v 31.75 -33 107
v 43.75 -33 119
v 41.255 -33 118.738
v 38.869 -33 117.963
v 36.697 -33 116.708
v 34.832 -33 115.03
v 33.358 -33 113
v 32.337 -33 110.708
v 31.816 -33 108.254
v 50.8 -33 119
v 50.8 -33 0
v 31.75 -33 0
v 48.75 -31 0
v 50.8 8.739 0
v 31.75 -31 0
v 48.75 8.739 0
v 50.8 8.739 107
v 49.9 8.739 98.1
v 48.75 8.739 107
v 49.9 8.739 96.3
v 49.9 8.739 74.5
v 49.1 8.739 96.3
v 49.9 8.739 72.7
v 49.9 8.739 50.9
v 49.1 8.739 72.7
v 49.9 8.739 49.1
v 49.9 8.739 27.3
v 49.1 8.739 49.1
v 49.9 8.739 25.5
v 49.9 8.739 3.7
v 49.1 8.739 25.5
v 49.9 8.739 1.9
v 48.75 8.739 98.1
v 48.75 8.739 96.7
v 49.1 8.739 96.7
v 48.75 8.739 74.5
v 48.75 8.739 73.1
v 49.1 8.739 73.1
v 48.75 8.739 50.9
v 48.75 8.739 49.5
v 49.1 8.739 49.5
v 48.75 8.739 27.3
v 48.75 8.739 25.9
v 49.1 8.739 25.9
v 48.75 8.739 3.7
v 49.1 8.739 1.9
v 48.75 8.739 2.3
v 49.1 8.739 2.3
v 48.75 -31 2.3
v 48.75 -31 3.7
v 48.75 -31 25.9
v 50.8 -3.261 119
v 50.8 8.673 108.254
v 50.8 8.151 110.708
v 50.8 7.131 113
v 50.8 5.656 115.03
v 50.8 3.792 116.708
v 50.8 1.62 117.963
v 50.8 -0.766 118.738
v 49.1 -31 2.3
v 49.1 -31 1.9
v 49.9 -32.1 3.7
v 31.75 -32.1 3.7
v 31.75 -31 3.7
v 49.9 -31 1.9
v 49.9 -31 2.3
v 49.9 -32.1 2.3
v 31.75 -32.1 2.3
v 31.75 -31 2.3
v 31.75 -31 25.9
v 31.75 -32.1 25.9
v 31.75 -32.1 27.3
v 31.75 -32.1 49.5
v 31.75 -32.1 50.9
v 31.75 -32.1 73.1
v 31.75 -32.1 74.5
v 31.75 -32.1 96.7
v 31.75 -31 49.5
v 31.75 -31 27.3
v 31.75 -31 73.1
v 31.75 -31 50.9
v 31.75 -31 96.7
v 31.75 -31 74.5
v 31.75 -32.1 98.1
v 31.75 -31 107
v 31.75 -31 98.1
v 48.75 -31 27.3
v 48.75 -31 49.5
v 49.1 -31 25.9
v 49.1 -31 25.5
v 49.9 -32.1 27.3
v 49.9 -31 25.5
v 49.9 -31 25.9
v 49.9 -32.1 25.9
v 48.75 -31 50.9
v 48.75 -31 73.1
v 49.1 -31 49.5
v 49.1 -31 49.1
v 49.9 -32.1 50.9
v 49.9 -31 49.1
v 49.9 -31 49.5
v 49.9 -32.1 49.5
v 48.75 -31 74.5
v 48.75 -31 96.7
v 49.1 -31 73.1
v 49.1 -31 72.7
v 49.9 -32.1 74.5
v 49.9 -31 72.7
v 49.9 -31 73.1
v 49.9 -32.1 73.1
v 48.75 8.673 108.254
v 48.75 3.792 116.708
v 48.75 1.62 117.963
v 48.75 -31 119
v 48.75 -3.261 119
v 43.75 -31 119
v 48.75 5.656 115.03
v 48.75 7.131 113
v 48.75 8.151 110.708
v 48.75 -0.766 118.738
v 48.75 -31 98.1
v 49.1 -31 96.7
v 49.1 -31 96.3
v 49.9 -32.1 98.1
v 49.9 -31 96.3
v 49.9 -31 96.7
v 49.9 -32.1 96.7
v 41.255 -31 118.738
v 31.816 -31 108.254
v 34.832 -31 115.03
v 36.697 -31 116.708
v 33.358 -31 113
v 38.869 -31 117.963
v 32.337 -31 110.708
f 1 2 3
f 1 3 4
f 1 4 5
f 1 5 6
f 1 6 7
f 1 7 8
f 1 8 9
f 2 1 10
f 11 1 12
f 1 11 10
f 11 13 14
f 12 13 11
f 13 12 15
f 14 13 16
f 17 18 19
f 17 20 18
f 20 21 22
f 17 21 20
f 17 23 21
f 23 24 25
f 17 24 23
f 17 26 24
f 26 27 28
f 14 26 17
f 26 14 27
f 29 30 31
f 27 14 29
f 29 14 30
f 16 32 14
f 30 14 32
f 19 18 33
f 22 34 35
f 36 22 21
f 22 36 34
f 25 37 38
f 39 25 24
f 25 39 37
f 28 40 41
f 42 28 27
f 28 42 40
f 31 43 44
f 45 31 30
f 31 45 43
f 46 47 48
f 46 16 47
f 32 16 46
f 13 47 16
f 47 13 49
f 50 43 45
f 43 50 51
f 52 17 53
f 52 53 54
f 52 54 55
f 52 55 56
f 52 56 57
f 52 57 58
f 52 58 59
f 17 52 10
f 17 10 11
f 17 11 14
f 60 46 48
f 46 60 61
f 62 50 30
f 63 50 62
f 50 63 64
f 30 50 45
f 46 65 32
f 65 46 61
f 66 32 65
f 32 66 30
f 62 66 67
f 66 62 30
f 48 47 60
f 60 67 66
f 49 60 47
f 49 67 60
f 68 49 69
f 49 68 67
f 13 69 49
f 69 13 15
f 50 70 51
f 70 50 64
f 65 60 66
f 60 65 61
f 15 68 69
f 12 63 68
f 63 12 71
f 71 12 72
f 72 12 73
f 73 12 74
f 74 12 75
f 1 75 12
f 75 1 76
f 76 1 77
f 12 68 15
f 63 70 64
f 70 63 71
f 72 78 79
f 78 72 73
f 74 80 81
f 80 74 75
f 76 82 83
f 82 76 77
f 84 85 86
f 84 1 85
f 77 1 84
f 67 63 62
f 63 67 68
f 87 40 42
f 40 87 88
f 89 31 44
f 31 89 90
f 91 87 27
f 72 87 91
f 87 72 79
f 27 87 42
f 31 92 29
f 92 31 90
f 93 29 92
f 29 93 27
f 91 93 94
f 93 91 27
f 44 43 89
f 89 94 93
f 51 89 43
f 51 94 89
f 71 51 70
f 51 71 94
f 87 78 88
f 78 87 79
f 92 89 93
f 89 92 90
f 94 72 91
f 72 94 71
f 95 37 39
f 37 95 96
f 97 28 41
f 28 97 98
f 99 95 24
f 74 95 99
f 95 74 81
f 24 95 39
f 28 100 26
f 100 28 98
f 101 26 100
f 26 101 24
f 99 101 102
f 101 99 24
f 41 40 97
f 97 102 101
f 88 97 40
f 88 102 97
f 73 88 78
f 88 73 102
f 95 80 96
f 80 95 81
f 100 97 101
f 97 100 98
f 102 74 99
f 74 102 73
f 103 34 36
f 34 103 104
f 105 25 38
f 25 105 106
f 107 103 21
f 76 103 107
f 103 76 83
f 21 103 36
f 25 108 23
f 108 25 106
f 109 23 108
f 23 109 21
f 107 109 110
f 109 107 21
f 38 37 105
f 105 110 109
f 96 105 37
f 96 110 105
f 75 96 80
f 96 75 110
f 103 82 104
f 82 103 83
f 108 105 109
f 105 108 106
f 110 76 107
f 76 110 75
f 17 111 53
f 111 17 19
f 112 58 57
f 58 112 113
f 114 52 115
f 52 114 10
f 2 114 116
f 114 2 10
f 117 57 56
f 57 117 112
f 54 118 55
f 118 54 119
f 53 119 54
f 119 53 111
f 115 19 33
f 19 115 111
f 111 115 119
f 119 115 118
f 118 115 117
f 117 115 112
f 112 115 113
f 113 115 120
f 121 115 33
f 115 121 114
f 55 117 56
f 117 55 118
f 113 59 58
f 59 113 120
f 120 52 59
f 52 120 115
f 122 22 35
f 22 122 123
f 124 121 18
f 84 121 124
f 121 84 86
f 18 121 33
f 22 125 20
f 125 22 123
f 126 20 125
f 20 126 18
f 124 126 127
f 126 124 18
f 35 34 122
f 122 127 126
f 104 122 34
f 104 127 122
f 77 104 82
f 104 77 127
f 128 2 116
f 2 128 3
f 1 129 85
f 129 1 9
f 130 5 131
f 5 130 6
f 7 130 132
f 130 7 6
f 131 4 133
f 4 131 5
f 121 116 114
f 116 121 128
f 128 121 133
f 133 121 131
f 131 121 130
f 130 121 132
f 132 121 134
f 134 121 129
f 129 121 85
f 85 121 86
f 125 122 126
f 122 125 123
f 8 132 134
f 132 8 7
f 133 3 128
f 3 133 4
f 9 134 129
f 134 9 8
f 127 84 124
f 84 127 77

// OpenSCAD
tol = 0.001;

// bounding boxes of tin sections
base = [94, 59, 13.5];  // portion visible below lip
lid = [94.5, 60, 7.5];  // height includes lip
lip = [96.5, 62, 1];
tin = [lip[0], lip[1], base[2]+lid[2]];
corner = 12;  // lip is 1mm more

module tin_slab(size, corner=corner) {
    x = size[0];
    y = size[1];
    z = size[2];
    translate([0, 0, z/2]) hull() {
            cube([x, y-2*corner, z], center=true);
            cube([x-2*corner, y, z], center=true);
            for (flip=[[1, 1], [1, -1], [-1, 1], [-1, -1]])
                translate([flip[0] * (x/2-corner), flip[1] * (y/2-corner)])
                    cylinder(r=corner, h=z, center=true);
    }
}

module tin_hull() {
    tin_slab([base[0], base[1], tin[2]]);  // bottom
    translate([0, 0, base[2]]) tin_slab(lid);  // top
    translate([0, 0, base[2]]) tin_slab(lip);  // lip
}

nozzle = 0.4;
width = 4*25.4;
wing = width/2 - base[0]/2;
sweep = corner * cos(asin(1-wing/corner));
shelf = [width-2, base[1]/2 + tin[1]/2, 1.6];
rail = [1.5*nozzle, shelf[1]-corner-sweep, nozzle];
rack = [width, 2+tin[1]/2+base[1]/2-corner-sweep, tin[2] + shelf[2] + 2];

module rack_shelf() {
    // main shelf
    difference() {
        union() {
            tin_slab([base[0], base[1], 1.6]);
            // rails
            translate([-shelf[0]/2, -tin[1]/2, 0])
                cube([shelf[0], rail[1], shelf[2]]);
        }
        translate([-shelf[0]/2+rail[0], -tin[1]/2-tol, rail[2]-shelf[2]])
            cube([shelf[0]-2*rail[0], rail[1]+tol, shelf[2]]);
    }
    // wings
    difference() {
        translate([-rack[0]/2, base[1]/2-corner-sweep, 0])
            cube([rack[0], sweep, shelf[2]]);
        for (flip=[0, 1]) mirror([flip, 0])
            translate([base[0]/2+corner, base[1]/2-corner, -shelf[2]])
                cylinder(r=corner, h=3*shelf[2]);
    }
    // back support rail
    translate([-shelf[0]/2, -tin[1]/2-1, rail[2]])
        cube([shelf[0], 2, shelf[2]-rail[2]]);
}

module rack_rounder(size, rounded=true) {
    x = min(size[0], size[1]);
    y = max(size[0], size[1]);
    z = size[2];
    mirror(size[1] < size[0] ? [-1, 1, 0] : [0, 0, 0]) hull() {
        cube([x, x, z]);
        cube([x, y-corner, z]);
        cube([x, y, z-corner]);
        translate([0, y-corner, z-corner]) intersection() {
            if (rounded) rotate([0, 90, 0]) cylinder(r=corner, h=x);
            cube([x, corner, corner]);
        }
    }
}

module rack_wall(tiers=5, rounded=true, flip=false, debug=false) {
    lift = (rack[2]-1) * (tiers-1);
    if (1 < tiers) {
        rack_wall(tiers-1, rounded=false, flip=flip, debug=debug);
    }
    wall = rack[0]/2 - tin[0]/2 - 1/2;
    scale([flip ? -1 : 1, 1, 1]) {
        // side
        difference() {
            translate([-rack[0]/2, -tin[1]/2-2, lift])
                rack_rounder([wall, rack[1], rack[2]], rounded=rounded);
            translate([-rack[0]/2+0.9, -tin[1]/2-3, lift+1.9])
                cube([rail[0]+0.2, rack[1]+2, shelf[2]+0.2]);
            translate([-rack[0]/2+0.9, -tin[1]/2-3, lift+nozzle+1.9])
                cube([wall, rack[1]+2, shelf[2]-nozzle+0.2]);
        }
        // back
        difference() {
            translate([-rack[0]/2, -tin[1]/2-2, lift])
                rack_rounder([3/16*rack[0], 2, rack[2]], rounded=rounded);
            translate([-rack[0]/2+0.9, -tin[1]/2-1.1, lift+rail[2]+1.9])
                cube([rack[0]-1.8, 1.1, shelf[2]-rail[2]+0.2]);
        }
        // show in context
        if (debug) {
            %translate([0, 0, lift+2]) rack_shelf();
            %translate([0, 0, lift+3.6]) tin_hull();
        }
    }
}

$fa = 12;
$fs = 0.1;
*rack_shelf();
left = true;
rack_wall(debug=true, flip=left);
%rack_wall(flip=!left);
